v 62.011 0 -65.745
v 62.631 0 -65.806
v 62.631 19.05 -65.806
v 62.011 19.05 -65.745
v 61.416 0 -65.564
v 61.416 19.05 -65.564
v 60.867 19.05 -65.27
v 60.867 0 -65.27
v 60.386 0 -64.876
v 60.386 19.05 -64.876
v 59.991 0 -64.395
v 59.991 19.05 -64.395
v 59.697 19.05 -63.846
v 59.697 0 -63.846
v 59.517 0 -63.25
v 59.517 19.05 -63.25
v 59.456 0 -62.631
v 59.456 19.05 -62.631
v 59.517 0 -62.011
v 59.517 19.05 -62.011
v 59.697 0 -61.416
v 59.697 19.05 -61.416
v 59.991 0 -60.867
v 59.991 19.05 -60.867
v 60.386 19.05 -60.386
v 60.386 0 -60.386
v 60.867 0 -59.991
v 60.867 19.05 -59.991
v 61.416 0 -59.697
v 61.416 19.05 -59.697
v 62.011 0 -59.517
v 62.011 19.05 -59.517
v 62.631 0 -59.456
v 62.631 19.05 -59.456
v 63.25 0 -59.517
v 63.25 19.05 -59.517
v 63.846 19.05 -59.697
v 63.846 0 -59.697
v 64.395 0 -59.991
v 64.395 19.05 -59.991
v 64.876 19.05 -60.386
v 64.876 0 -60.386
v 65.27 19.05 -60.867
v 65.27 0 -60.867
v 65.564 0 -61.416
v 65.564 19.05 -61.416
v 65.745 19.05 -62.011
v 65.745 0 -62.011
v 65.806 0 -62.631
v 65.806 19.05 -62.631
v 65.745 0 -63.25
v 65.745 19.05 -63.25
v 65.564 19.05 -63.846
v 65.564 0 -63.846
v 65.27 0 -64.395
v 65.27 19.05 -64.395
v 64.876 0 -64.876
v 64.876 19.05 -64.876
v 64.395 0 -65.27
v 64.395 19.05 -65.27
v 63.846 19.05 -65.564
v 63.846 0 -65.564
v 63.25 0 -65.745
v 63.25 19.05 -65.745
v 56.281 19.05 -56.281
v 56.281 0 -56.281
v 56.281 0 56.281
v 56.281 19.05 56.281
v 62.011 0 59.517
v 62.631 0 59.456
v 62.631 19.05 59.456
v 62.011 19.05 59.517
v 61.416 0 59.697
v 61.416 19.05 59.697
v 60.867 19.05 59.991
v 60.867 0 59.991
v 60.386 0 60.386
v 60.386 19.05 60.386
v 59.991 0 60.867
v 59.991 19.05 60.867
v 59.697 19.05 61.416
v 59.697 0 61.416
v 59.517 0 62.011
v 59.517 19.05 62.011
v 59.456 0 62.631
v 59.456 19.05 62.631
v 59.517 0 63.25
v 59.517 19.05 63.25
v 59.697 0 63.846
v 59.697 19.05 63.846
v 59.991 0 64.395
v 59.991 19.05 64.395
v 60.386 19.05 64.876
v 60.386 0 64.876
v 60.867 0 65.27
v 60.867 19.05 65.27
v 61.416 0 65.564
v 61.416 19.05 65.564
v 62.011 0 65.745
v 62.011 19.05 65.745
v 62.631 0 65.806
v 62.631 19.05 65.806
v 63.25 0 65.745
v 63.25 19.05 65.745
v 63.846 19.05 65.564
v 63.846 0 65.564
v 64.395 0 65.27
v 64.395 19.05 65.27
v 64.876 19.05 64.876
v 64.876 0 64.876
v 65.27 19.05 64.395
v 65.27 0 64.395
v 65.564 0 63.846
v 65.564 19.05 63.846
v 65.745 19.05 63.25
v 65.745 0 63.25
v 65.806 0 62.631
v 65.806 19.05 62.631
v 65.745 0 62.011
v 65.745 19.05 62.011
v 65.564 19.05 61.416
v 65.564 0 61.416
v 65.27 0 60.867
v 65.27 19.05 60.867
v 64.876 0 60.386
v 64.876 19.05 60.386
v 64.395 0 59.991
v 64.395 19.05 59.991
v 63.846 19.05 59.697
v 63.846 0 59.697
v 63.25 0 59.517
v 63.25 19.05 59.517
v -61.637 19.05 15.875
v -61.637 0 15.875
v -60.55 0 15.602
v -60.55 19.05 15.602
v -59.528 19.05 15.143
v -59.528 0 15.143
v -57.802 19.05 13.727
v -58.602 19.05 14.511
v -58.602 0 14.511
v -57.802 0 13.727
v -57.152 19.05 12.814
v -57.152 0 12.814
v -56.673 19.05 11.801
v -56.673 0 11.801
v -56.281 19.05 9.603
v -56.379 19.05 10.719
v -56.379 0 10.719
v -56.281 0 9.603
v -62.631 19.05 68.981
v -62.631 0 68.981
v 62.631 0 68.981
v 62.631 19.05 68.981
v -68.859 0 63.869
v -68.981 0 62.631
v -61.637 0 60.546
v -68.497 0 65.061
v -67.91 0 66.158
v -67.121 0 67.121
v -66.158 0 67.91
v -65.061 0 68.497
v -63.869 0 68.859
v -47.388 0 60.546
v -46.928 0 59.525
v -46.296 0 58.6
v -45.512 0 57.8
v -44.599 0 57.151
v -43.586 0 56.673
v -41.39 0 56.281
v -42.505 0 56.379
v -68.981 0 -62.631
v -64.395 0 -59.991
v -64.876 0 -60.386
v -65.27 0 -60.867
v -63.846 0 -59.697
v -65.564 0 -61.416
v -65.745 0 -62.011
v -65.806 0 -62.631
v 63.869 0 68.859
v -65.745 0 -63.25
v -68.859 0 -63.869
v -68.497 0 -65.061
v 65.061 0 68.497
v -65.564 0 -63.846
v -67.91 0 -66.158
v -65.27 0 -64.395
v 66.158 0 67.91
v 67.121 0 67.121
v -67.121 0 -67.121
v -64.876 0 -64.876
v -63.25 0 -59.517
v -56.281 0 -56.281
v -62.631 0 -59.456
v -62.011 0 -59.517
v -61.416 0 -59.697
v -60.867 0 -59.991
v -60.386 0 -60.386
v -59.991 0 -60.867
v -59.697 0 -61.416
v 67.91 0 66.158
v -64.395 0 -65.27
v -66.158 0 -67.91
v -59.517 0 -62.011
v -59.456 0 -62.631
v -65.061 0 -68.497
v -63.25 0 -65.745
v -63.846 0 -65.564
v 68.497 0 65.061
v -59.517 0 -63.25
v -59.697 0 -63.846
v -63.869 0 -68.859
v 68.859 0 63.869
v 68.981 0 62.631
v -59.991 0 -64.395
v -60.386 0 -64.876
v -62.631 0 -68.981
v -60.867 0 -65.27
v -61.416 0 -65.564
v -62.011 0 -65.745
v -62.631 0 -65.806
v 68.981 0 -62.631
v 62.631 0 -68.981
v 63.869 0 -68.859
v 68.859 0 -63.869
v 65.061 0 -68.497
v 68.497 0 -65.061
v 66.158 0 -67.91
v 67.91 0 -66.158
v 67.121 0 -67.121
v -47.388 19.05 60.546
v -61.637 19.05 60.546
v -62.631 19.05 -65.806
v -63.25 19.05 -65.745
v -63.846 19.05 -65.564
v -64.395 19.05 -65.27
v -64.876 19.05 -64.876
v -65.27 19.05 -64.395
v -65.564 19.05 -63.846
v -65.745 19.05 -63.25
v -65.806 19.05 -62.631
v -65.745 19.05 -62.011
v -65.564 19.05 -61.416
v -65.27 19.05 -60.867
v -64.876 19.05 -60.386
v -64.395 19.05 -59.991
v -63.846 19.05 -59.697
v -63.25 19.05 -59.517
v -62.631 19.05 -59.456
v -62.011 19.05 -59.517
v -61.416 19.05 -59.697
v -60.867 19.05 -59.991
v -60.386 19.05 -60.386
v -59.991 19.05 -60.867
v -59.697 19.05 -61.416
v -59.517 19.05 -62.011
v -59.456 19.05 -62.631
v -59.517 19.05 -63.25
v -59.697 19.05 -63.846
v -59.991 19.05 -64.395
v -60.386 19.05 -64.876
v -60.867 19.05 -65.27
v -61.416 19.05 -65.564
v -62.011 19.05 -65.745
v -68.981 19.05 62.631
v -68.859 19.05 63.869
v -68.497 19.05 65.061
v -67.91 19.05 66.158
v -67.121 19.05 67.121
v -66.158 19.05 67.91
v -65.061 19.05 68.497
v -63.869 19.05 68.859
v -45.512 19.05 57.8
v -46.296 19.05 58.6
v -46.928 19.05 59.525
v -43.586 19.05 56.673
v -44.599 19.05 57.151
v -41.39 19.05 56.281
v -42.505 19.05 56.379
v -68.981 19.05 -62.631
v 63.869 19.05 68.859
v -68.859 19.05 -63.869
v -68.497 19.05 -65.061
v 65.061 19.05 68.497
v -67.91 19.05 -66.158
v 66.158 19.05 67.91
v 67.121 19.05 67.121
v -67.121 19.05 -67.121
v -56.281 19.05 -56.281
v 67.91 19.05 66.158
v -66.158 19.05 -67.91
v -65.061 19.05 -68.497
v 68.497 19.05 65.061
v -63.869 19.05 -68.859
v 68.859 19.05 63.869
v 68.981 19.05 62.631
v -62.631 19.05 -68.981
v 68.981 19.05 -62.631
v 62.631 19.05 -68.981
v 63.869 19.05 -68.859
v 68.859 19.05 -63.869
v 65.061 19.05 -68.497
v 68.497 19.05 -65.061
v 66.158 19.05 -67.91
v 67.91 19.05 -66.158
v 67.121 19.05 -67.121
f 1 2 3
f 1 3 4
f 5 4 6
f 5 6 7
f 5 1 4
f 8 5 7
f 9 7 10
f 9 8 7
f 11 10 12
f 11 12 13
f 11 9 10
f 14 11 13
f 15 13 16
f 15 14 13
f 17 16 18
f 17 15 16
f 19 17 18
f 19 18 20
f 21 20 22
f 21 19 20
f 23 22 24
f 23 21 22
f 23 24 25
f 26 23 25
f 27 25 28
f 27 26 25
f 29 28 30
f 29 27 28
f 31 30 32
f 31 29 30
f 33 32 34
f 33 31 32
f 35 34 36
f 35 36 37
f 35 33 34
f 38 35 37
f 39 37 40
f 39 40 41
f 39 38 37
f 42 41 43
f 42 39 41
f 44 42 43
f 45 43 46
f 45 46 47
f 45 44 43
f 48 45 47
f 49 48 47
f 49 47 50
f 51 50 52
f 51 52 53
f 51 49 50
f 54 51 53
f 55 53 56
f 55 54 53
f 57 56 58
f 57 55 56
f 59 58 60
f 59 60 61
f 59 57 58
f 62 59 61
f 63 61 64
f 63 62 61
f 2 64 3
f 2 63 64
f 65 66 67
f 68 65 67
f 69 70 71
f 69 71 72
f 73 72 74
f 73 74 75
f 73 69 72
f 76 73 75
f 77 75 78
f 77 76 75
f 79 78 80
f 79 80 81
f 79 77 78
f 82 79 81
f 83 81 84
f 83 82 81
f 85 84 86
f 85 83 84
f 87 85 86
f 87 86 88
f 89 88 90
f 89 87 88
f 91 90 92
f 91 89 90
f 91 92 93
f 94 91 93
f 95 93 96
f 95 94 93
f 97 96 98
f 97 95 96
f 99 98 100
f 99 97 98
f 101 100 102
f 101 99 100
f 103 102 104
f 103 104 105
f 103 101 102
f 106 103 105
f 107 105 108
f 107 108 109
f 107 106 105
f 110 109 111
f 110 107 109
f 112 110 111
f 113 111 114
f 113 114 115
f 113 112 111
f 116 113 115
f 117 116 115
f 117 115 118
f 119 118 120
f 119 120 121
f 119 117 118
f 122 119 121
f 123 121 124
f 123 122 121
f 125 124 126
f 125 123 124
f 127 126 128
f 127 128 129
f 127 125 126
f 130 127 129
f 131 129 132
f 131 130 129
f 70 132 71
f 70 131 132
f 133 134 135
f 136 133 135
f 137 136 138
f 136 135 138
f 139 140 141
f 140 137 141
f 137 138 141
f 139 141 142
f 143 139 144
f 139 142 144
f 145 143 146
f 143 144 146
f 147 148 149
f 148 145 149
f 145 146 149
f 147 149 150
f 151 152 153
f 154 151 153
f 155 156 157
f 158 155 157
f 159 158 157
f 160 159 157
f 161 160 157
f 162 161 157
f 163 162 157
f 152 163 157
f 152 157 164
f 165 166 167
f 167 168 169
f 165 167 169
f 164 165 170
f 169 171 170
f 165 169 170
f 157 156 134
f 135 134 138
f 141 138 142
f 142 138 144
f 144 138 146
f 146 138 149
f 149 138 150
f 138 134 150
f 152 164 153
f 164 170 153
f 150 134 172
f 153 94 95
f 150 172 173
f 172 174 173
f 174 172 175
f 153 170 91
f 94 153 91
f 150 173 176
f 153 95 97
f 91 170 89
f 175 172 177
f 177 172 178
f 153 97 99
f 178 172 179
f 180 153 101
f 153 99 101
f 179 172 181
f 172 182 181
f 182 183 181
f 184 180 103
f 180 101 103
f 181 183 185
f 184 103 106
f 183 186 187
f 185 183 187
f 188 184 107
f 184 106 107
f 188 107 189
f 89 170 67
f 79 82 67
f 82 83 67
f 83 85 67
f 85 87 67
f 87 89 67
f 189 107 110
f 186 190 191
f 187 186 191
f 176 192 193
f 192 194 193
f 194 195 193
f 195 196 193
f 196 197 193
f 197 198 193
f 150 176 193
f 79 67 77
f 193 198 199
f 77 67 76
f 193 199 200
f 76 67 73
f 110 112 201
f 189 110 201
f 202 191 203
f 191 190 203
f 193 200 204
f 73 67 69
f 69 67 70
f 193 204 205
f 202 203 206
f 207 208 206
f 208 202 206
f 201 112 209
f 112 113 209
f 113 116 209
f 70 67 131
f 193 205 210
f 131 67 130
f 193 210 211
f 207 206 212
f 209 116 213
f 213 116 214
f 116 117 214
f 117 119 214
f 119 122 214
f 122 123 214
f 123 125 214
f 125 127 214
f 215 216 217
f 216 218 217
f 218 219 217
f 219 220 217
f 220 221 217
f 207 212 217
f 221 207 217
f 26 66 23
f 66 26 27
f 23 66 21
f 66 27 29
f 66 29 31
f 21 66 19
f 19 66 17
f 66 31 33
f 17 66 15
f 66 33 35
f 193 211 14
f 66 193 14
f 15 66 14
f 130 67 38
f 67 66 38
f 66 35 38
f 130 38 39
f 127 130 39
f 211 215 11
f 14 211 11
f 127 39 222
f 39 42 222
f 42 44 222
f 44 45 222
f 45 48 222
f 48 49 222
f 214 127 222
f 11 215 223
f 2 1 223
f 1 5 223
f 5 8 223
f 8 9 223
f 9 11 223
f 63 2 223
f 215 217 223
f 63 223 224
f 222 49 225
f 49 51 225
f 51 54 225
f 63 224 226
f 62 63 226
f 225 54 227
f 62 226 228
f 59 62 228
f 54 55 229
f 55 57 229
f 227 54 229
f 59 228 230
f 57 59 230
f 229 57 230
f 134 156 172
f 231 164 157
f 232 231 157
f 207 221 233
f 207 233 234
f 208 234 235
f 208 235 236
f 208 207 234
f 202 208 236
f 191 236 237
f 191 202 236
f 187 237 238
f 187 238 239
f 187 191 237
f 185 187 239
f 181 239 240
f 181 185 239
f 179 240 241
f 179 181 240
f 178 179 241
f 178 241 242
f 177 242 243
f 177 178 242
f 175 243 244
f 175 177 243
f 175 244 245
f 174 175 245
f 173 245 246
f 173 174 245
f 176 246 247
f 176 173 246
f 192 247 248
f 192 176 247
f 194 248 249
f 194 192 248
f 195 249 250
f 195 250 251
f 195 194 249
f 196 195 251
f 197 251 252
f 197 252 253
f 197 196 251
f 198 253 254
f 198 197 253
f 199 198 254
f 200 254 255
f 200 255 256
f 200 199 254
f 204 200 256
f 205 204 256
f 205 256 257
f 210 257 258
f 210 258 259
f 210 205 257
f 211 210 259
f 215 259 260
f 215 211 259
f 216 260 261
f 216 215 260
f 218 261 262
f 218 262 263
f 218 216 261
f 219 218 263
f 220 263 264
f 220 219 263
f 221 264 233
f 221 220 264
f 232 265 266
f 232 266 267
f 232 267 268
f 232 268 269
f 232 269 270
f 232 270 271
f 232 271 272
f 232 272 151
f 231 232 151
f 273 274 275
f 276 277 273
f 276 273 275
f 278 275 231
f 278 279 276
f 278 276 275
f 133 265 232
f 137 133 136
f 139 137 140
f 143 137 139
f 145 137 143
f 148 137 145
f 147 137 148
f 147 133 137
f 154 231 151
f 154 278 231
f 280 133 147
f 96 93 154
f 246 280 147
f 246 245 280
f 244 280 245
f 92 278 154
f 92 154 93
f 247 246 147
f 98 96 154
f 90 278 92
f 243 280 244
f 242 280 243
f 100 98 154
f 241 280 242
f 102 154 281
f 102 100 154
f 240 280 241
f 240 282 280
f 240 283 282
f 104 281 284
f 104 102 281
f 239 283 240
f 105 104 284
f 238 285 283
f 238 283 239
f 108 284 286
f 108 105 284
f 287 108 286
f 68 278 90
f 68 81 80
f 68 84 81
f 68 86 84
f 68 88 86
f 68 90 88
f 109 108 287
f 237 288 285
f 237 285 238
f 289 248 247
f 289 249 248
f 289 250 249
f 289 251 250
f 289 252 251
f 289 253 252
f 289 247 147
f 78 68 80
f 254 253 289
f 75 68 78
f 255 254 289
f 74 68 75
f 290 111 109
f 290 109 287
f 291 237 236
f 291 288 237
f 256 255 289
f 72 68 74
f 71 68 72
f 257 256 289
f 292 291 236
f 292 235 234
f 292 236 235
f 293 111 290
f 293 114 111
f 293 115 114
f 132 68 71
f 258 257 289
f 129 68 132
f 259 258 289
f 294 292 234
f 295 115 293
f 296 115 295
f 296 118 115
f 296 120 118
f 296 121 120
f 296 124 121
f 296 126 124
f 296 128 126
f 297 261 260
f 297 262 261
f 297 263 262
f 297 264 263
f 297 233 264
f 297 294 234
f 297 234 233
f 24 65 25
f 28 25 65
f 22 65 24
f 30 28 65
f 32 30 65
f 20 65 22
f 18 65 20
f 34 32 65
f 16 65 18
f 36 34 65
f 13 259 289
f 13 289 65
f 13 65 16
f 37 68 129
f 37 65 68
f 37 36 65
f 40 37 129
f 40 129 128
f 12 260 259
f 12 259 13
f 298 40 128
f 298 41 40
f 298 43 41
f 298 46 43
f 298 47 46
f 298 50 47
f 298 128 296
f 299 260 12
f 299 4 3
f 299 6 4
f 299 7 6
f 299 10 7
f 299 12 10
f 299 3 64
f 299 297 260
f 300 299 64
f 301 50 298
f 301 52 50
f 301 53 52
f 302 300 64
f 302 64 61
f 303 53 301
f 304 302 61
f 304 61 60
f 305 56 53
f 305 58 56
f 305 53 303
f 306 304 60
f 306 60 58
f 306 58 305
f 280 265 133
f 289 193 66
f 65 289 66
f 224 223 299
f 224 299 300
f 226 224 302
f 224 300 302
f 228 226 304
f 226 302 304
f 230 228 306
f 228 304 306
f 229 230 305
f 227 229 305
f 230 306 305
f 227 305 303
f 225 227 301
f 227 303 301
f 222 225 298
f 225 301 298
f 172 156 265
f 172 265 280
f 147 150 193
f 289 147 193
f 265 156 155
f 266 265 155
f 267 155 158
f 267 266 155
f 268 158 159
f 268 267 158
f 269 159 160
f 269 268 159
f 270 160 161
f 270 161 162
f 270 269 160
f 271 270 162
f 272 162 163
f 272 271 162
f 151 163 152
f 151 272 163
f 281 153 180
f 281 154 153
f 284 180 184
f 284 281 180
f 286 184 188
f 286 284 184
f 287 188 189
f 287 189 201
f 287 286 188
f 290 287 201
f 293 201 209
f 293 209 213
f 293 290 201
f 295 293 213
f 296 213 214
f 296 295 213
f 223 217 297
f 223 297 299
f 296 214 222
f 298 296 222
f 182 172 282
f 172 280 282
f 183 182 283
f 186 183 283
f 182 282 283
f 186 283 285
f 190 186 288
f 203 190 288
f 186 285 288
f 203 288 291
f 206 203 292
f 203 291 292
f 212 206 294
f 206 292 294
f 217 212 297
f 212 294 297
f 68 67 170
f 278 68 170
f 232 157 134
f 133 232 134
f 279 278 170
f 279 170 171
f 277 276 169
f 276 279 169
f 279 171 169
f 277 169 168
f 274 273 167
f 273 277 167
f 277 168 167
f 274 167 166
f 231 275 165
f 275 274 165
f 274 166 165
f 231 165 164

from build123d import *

# Parameters (mm, degrees)
SKETCH1_W           = 137.961167182
SKETCH1_H           = 137.961167182
SKETCH1_R           = 3.175
BOSS_EXTRUDE1_DEPTH = 19.05
FILLET1_R           = 6.35
FILLET2_R           = 6.35


with BuildPart() as part:
    # Sketch1 → Boss-Extrude1 (new body)
    with BuildSketch(Plane(origin=(0, 0, 0), x_dir=(1, 0, 0), z_dir=(0, 1, 0))):
        Rectangle(SKETCH1_W, SKETCH1_H)
        Polygon((-61.63707698, -60.545979349), (-61.63707698, -15.874596852), (-56.280583591, -15.874596852), (-56.280583591, 56.280583591), (56.280583591, 56.280583591), (56.280583591, -56.280583591), (-47.38767698, -56.280583591), (-47.38767698, -60.545979349), align=None, mode=Mode.SUBTRACT)
        with Locations(Location((62.630583591, -62.630583591, 0), (0, 0, 90))):
            Circle(SKETCH1_R, mode=Mode.SUBTRACT)
        with Locations(Location((-62.630583591, 62.630583591, 0), (0, 0, 90))):
            Circle(SKETCH1_R, mode=Mode.SUBTRACT)
        with Locations(Location((62.630583591, 62.630583591, 0), (0, 0, 90))):
            Circle(SKETCH1_R, mode=Mode.SUBTRACT)
    extrude(amount=BOSS_EXTRUDE1_DEPTH)

    # Fillet1
    fillet1_edges = [part.edges().sort_by_distance(p)[0] for p in [
        (68.980583591, 9.525, -68.980583591),
        (68.980583591, 9.525, 68.980583591),
        (-68.980583591, 9.525, 68.980583591),
        (-68.980583591, 9.525, -68.980583591),
    ]]
    fillet(fillet1_edges, radius=FILLET1_R)

    # Fillet2
    # the kernel refuses this fillet: 6.35 mm, written as the material it takes off along each edge
    with BuildSketch(Plane(origin=(-56.280583591, -15.679493896, 15.874596852), x_dir=(-1, 0, 0), z_dir=(0, 1, 0))) as fillet2_piece_1:
        with BuildLine():
            CenterArc((6.35, -6.271797558), FILLET2_R, 99.001349837, 80.998650163)
            Line((0, -6.271797558), (-0.127, -6.271797558))
            Line((-0.127, -6.271797558), (-0.127, 0))
            Line((-0.127, 0), (0, 0.127))
            ThreePointArc((0, 0.127), (2.678246694, 0.127), (5.336623257, 0.125435951))
            Line((5.336623257, 0.125435951), (5.356493389, 0))
        make_face()
    extrude(amount=50.408987792, mode=Mode.SUBTRACT)
    with BuildSketch(Plane(origin=(-47.38767698, -14.99519197, 56.280583591), x_dir=(1, 0, 0), z_dir=(0, 1, 0))) as fillet2_piece_2:
        with BuildLine():
            CenterArc((5.998076788, -6.35), FILLET2_R, 90, 70.835337627)
            Line((0, -4.265395758), (-0.119961536, -4.223703673))
            ThreePointArc((-0.119961536, -4.223703673), (-0.127, -2.132697879), (-0.127, 0))
            Line((-0.127, 0), (0, 0.127))
            Line((0, 0.127), (5.998076788, 0.127))
            Line((5.998076788, 0.127), (5.998076788, 0))
        make_face()
    extrude(amount=49.04038394, mode=Mode.SUBTRACT)


solid = part.part
